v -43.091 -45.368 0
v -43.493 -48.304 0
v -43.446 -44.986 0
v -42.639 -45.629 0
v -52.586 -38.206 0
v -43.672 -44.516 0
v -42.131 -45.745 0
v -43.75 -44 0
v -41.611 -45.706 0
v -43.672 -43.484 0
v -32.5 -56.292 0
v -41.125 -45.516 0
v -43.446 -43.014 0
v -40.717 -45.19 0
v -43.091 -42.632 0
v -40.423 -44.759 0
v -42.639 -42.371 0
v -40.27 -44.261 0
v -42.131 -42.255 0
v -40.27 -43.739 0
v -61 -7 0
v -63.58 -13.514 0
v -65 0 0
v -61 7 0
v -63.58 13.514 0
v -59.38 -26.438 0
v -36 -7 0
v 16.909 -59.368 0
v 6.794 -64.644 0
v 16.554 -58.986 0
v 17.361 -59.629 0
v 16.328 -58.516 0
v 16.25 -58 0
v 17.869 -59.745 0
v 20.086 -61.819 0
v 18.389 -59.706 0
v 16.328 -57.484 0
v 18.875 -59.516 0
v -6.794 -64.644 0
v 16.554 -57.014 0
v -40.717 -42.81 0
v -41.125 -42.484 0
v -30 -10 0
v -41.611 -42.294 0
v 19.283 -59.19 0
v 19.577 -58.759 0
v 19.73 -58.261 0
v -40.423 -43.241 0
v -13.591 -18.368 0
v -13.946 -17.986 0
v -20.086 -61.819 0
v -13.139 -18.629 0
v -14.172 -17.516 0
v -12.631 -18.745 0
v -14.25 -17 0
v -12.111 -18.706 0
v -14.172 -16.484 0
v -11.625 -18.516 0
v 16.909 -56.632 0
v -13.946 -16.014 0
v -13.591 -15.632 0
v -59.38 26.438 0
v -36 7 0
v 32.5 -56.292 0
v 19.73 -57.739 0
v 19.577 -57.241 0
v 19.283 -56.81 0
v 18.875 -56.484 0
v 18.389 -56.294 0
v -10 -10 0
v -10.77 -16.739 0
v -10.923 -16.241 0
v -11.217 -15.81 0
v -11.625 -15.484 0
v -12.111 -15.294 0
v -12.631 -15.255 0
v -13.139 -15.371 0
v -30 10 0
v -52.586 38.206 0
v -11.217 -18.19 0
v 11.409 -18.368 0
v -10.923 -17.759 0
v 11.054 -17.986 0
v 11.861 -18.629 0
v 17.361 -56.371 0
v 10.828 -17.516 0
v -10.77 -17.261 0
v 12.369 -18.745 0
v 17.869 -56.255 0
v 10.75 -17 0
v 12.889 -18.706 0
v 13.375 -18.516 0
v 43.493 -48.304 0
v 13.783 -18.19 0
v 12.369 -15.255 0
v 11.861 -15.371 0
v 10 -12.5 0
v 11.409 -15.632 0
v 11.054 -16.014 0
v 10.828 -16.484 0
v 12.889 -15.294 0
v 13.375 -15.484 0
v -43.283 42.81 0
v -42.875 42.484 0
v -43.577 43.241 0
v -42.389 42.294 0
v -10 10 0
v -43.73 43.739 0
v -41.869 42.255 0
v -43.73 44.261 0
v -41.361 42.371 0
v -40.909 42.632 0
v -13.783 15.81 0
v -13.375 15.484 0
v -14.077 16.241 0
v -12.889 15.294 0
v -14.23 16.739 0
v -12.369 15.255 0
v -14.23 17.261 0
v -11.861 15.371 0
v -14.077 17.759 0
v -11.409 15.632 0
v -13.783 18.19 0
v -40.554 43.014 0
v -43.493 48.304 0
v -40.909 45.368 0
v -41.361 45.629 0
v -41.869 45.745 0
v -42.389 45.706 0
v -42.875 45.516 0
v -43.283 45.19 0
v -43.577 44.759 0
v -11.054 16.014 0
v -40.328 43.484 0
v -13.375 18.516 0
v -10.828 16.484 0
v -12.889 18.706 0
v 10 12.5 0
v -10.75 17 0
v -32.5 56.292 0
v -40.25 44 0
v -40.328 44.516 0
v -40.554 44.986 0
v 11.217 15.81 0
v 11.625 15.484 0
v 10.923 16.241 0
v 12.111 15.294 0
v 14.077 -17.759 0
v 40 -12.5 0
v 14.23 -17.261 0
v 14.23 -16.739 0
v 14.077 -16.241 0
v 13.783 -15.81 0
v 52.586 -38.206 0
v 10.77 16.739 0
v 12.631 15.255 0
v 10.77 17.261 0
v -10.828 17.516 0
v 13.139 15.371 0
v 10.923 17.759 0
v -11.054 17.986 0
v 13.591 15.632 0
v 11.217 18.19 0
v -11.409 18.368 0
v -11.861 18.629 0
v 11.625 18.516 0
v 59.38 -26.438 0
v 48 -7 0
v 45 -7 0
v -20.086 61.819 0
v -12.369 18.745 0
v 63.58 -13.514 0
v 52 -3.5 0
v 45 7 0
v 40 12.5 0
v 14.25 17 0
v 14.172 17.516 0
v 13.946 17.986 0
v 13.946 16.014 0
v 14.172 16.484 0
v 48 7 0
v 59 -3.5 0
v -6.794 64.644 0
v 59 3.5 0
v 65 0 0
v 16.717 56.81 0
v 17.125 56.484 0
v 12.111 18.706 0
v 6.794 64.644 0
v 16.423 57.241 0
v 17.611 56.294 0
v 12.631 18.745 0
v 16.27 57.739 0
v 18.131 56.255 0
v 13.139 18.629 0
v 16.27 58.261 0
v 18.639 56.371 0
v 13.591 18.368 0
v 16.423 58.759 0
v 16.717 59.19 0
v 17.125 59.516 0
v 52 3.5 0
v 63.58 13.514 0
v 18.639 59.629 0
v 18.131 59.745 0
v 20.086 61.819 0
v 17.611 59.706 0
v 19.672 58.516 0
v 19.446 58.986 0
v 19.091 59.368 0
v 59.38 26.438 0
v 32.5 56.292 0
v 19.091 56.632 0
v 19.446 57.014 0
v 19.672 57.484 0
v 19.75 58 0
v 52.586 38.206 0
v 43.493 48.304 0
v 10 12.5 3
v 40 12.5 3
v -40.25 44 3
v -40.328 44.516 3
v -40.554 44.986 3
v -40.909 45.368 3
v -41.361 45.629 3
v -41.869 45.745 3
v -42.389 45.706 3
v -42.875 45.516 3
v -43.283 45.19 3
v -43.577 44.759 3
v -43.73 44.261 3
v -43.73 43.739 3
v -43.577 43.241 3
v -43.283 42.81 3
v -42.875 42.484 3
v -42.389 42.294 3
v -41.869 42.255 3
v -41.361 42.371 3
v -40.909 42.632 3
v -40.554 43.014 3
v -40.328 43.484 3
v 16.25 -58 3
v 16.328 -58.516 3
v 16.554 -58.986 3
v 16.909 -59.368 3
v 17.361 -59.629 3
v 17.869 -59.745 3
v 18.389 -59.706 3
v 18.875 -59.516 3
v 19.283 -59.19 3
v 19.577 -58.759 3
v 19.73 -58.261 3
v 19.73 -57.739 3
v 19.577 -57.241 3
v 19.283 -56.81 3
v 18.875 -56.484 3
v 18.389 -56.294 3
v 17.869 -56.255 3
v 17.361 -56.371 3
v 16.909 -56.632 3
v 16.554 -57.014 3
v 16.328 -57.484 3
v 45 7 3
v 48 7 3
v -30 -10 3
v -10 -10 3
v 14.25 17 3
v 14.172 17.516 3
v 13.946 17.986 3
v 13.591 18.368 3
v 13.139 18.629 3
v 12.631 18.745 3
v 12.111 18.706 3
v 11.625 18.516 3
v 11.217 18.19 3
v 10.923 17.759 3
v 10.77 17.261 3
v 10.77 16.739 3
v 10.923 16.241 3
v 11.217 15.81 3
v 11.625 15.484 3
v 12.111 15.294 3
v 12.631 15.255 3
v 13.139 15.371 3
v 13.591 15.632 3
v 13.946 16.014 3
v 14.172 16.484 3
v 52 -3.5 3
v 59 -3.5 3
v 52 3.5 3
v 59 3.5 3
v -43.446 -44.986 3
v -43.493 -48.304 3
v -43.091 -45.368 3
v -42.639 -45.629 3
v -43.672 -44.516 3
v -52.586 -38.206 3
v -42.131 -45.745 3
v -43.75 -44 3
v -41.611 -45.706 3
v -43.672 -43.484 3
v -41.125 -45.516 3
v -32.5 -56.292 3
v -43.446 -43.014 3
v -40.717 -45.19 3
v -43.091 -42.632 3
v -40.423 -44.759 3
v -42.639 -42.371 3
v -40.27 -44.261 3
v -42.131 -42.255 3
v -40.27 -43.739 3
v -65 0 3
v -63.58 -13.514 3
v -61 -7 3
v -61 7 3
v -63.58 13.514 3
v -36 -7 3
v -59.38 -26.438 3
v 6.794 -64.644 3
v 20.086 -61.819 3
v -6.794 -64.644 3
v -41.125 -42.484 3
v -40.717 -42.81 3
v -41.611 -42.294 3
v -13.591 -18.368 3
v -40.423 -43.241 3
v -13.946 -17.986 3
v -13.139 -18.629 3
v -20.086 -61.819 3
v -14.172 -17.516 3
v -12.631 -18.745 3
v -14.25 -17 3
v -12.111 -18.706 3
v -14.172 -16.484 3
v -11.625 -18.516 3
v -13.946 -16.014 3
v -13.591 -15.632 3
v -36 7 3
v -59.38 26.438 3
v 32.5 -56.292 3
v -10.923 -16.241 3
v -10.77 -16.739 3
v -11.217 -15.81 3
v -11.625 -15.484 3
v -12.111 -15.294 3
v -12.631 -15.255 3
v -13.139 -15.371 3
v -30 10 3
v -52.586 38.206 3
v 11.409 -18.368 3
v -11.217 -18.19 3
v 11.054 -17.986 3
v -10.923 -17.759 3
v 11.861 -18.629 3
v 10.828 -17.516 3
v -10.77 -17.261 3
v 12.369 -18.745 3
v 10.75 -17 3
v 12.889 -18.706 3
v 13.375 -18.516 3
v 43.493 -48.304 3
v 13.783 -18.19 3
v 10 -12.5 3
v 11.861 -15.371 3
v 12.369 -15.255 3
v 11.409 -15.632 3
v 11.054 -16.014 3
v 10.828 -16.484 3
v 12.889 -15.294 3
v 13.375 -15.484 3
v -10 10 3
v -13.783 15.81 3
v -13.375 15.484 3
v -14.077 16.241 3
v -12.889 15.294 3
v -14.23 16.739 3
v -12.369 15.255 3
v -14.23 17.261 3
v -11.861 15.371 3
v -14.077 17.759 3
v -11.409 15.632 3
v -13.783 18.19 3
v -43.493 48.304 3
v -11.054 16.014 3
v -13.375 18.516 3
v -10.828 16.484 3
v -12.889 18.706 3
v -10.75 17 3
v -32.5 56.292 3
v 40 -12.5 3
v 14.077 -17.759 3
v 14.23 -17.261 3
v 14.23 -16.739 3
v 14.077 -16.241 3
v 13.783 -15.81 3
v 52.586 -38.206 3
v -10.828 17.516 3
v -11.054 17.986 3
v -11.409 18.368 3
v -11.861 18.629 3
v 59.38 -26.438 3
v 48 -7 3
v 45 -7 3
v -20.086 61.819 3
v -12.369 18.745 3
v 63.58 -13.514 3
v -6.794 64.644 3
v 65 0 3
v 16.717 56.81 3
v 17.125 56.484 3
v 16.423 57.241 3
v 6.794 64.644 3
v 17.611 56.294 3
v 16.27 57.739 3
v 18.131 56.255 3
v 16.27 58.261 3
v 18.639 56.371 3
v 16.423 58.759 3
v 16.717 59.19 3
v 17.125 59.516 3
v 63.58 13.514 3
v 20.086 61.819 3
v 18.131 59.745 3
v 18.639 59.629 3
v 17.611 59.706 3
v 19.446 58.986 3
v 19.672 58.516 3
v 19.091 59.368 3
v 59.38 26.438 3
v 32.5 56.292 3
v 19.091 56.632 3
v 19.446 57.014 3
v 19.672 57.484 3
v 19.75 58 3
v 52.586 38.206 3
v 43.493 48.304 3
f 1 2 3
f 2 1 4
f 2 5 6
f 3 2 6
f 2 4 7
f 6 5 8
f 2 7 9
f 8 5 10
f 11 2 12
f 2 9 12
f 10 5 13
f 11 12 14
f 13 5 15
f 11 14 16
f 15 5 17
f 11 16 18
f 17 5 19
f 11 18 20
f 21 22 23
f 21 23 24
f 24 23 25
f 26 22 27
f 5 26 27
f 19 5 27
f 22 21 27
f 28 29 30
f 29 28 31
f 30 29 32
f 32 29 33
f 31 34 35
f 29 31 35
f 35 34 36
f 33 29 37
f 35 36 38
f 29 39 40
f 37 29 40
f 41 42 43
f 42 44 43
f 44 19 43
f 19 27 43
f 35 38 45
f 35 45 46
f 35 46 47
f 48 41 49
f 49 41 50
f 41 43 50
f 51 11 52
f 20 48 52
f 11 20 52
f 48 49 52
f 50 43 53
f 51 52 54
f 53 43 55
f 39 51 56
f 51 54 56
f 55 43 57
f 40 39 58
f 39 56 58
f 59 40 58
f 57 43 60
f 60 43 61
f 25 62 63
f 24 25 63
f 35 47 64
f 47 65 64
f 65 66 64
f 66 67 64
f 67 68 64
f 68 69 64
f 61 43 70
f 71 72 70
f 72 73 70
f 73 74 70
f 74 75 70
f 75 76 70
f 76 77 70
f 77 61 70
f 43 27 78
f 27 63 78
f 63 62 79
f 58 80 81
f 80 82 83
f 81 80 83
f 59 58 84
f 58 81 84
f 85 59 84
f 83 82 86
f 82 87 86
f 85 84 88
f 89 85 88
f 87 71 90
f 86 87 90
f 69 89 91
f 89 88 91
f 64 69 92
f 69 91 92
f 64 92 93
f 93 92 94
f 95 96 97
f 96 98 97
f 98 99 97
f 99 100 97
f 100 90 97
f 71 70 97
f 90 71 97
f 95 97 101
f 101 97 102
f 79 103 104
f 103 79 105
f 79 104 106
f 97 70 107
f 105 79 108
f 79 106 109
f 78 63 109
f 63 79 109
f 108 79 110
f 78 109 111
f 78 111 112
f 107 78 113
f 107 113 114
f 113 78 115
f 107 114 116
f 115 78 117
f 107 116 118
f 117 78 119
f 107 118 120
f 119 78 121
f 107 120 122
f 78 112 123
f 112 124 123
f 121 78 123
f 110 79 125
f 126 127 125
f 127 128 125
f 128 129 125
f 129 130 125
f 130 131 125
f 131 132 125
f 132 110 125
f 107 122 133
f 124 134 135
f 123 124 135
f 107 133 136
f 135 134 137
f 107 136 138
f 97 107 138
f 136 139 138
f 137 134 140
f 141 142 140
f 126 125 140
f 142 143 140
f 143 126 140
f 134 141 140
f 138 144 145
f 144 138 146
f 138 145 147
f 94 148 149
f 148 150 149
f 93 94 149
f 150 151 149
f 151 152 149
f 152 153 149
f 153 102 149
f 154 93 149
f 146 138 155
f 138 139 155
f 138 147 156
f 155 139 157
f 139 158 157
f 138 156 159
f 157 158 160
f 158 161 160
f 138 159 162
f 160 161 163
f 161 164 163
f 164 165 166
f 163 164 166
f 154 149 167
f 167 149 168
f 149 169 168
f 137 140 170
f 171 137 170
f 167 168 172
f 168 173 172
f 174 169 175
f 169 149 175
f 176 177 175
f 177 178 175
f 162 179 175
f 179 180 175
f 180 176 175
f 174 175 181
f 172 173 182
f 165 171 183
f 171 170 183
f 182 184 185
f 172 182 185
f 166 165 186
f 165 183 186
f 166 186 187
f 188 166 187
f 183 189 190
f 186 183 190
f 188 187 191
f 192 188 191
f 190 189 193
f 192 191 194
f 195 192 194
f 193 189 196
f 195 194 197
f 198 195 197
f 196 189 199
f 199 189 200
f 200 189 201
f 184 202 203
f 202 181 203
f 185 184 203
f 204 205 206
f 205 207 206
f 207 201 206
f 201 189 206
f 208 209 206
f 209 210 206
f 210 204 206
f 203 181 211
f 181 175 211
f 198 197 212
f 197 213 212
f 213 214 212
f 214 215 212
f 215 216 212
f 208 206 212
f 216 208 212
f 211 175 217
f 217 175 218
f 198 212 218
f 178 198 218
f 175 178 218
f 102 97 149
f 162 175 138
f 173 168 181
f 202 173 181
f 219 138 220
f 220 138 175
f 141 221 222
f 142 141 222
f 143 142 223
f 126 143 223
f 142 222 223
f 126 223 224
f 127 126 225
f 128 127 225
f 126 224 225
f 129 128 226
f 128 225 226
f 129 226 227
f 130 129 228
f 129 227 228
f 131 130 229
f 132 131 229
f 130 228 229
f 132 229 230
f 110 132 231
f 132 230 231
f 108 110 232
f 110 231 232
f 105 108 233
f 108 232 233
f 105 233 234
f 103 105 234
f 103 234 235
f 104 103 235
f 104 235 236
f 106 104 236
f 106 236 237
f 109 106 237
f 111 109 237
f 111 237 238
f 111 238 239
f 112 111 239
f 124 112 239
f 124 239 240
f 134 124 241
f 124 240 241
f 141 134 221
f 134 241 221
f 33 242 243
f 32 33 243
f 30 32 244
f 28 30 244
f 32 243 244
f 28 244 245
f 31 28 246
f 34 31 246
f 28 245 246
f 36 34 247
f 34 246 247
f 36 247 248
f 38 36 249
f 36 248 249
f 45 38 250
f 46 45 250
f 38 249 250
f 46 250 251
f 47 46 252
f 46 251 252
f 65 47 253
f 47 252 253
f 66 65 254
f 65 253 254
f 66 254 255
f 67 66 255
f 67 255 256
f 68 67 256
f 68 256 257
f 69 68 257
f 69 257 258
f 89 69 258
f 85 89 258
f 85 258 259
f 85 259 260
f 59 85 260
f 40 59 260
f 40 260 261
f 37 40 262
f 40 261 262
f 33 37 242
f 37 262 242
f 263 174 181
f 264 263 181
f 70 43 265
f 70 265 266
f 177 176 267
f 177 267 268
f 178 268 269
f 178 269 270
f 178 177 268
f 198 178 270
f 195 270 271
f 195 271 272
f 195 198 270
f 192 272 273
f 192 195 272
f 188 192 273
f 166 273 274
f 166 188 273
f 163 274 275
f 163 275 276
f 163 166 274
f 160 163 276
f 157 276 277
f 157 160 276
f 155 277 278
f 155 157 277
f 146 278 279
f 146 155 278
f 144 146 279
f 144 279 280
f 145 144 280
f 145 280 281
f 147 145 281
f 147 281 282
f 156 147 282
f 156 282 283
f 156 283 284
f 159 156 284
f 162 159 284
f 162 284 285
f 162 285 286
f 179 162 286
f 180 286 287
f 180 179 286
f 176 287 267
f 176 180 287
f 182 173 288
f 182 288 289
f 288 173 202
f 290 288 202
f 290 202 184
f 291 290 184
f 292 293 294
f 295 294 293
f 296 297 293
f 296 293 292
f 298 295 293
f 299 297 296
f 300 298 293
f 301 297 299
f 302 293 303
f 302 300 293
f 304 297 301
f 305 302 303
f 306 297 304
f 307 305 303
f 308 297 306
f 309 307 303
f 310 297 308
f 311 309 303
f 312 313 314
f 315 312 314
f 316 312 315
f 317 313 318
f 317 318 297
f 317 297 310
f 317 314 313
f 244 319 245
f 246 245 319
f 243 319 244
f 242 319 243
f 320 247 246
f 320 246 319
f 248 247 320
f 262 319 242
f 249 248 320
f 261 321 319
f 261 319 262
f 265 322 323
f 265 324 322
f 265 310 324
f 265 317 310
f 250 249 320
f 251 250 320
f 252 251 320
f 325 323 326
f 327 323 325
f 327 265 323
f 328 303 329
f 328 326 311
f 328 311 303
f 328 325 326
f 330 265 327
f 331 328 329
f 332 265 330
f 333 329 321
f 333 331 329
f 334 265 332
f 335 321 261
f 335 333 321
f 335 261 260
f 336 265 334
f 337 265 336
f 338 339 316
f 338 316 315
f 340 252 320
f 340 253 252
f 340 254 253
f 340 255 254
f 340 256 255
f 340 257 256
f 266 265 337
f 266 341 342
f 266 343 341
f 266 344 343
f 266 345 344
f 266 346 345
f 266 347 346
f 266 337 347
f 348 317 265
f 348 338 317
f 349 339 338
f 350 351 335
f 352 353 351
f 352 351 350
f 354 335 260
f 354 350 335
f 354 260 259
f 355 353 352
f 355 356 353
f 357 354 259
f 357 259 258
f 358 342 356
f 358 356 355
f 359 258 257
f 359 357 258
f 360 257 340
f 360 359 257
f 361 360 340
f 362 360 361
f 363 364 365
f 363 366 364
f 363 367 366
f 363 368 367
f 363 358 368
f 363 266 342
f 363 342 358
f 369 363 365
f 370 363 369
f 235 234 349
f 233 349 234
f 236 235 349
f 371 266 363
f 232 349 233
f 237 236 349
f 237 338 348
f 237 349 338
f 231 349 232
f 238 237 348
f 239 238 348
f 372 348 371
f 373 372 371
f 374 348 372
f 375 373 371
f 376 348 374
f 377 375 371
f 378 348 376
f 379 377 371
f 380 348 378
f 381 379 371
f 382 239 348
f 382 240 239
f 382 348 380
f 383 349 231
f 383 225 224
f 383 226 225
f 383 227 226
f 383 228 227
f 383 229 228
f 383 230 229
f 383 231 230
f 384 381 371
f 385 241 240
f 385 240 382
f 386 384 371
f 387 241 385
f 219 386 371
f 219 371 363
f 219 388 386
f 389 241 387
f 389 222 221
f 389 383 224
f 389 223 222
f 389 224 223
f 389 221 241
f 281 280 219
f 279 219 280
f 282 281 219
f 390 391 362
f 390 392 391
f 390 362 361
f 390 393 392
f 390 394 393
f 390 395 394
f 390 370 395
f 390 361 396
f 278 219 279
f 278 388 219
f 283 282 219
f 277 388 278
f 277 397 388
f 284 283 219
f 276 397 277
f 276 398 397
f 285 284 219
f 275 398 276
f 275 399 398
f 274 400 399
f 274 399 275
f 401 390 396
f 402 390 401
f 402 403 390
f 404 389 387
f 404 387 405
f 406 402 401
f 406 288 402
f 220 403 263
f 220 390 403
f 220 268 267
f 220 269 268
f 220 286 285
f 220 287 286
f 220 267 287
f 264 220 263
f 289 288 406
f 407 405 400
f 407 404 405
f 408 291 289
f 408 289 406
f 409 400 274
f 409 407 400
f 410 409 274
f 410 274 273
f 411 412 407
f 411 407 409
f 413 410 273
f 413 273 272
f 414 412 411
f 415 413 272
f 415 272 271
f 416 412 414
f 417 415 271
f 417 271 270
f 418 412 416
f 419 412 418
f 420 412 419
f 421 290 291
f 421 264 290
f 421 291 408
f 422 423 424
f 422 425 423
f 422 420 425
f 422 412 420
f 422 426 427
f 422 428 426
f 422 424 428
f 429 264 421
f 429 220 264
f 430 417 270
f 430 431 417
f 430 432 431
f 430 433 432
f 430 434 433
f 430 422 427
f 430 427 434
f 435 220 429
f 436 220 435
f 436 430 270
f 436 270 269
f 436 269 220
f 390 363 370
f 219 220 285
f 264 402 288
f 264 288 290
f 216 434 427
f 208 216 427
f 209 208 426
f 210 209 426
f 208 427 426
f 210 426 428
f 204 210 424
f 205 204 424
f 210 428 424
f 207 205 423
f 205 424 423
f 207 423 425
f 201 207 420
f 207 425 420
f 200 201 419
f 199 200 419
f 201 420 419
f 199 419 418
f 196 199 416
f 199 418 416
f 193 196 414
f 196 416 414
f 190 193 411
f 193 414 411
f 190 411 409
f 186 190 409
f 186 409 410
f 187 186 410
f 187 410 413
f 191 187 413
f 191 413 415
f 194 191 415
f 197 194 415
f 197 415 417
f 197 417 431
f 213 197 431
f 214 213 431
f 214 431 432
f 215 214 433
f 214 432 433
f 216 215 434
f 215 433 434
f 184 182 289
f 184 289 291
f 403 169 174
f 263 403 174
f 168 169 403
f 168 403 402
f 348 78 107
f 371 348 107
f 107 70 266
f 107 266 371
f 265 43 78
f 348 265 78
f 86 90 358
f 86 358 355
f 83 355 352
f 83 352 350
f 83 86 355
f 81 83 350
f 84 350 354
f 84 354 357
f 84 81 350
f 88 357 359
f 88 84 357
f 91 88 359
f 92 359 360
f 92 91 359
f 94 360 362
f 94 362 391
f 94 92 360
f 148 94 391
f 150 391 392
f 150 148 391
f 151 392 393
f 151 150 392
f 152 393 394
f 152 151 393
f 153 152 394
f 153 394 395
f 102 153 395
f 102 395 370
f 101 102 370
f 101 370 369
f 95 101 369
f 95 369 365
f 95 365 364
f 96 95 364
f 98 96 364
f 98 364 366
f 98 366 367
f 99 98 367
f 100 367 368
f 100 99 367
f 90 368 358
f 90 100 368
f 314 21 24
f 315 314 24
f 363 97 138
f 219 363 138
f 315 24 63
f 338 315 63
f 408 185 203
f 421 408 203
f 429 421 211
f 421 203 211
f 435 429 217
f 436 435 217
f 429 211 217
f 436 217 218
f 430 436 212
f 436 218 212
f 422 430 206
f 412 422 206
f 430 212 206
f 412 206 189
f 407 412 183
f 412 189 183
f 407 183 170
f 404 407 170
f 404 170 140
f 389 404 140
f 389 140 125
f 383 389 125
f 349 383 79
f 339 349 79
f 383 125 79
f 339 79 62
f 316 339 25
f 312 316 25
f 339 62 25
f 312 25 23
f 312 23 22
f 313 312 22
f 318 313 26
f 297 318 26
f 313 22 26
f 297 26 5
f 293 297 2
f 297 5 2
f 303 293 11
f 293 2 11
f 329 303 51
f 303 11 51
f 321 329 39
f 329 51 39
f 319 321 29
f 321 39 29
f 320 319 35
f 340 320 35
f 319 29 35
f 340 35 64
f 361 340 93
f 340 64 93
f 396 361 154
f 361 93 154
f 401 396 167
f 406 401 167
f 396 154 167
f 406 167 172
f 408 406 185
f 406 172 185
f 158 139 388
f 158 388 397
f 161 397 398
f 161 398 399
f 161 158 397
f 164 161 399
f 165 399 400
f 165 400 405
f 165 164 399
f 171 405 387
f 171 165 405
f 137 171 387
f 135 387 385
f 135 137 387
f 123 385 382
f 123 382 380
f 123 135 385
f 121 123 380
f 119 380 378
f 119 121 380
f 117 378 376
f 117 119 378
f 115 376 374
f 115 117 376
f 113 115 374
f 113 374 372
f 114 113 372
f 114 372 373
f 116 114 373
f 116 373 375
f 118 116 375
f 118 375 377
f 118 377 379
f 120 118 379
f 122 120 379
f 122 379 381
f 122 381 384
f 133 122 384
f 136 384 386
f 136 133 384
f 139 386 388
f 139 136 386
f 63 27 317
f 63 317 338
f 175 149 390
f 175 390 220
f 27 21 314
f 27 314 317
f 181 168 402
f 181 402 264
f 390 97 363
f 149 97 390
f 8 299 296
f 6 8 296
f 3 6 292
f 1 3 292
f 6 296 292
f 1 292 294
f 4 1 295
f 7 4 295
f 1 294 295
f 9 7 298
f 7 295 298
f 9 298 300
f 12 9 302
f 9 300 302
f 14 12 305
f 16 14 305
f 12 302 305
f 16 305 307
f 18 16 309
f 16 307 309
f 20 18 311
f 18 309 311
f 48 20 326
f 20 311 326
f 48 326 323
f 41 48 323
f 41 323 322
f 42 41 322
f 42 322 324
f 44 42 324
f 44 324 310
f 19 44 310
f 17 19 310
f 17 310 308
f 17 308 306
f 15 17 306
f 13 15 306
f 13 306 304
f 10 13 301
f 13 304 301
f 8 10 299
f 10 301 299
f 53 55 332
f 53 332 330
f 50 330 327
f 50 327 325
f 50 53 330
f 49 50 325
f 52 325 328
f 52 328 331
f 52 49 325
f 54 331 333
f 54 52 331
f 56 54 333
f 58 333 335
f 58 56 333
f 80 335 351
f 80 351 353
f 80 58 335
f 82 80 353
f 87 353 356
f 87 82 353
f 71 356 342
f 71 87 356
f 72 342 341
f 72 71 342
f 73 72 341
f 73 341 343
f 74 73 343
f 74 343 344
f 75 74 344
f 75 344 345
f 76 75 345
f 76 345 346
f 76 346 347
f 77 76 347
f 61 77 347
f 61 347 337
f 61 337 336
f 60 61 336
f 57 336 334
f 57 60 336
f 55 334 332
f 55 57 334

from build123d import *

# Parameters (mm, degrees)
CROQUIS1_R              = 65
CROQUIS1_R_2            = 1.75
CROQUIS1_W              = 20
CROQUIS1_H              = 20
CROQUIS1_W_2            = 25
CROQUIS1_H_2            = 14
CROQUIS1_W_3            = 30
CROQUIS1_H_3            = 25
CROQUIS1_W_4            = 3
CROQUIS1_W_5            = 7
CROQUIS1_H_4            = 7
SALIENTE_EXTRUIR1_DEPTH = 3
CROQUIS2_R              = 1.75
CORTAR_EXTRUIR1_DEPTH   = 3


with BuildPart() as part:
    # Croquis1 → Saliente-Extruir1 (new body)
    with BuildSketch(Plane.XY):
        Circle(CROQUIS1_R)
        with Locations((-12.5, 17)):
            Circle(CROQUIS1_R_2, mode=Mode.SUBTRACT)
        with Locations((12.5, 17)):
            Circle(CROQUIS1_R_2, mode=Mode.SUBTRACT)
        with Locations(Location((12.5, -17, 0), (0, 0, 180))):
            Circle(CROQUIS1_R_2, mode=Mode.SUBTRACT)
        with Locations(Location((-12.5, -17, 0), (0, 0, 180))):
            Circle(CROQUIS1_R_2, mode=Mode.SUBTRACT)
        with Locations((-20, 0)):
            Rectangle(CROQUIS1_W, CROQUIS1_H, mode=Mode.SUBTRACT)
        with Locations((-48.5, 0)):
            Rectangle(CROQUIS1_W_2, CROQUIS1_H_2, mode=Mode.SUBTRACT)
        with Locations((25, 0)):
            Rectangle(CROQUIS1_W_3, CROQUIS1_H_3, mode=Mode.SUBTRACT)
        with Locations((46.5, 0)):
            Rectangle(CROQUIS1_W_4, CROQUIS1_H_2, mode=Mode.SUBTRACT)
        with Locations((55.5, 0)):
            Rectangle(CROQUIS1_W_5, CROQUIS1_H_4, mode=Mode.SUBTRACT)
    extrude(amount=SALIENTE_EXTRUIR1_DEPTH)

    # Croquis2 → Cortar-Extruir1 (cut)
    with BuildSketch(Plane.XY.offset(3)):
        with Locations((-42, 44)):
            Circle(CROQUIS2_R)
        with Locations((18, 58)):
            Circle(CROQUIS2_R)
        with Locations(Location((18, -58, 0), (0, 0, 180))):
            Circle(CROQUIS2_R)
        with Locations(Location((-42, -44, 0), (0, 0, 180))):
            Circle(CROQUIS2_R)
    extrude(amount=-CORTAR_EXTRUIR1_DEPTH, mode=Mode.SUBTRACT)


solid = part.part
